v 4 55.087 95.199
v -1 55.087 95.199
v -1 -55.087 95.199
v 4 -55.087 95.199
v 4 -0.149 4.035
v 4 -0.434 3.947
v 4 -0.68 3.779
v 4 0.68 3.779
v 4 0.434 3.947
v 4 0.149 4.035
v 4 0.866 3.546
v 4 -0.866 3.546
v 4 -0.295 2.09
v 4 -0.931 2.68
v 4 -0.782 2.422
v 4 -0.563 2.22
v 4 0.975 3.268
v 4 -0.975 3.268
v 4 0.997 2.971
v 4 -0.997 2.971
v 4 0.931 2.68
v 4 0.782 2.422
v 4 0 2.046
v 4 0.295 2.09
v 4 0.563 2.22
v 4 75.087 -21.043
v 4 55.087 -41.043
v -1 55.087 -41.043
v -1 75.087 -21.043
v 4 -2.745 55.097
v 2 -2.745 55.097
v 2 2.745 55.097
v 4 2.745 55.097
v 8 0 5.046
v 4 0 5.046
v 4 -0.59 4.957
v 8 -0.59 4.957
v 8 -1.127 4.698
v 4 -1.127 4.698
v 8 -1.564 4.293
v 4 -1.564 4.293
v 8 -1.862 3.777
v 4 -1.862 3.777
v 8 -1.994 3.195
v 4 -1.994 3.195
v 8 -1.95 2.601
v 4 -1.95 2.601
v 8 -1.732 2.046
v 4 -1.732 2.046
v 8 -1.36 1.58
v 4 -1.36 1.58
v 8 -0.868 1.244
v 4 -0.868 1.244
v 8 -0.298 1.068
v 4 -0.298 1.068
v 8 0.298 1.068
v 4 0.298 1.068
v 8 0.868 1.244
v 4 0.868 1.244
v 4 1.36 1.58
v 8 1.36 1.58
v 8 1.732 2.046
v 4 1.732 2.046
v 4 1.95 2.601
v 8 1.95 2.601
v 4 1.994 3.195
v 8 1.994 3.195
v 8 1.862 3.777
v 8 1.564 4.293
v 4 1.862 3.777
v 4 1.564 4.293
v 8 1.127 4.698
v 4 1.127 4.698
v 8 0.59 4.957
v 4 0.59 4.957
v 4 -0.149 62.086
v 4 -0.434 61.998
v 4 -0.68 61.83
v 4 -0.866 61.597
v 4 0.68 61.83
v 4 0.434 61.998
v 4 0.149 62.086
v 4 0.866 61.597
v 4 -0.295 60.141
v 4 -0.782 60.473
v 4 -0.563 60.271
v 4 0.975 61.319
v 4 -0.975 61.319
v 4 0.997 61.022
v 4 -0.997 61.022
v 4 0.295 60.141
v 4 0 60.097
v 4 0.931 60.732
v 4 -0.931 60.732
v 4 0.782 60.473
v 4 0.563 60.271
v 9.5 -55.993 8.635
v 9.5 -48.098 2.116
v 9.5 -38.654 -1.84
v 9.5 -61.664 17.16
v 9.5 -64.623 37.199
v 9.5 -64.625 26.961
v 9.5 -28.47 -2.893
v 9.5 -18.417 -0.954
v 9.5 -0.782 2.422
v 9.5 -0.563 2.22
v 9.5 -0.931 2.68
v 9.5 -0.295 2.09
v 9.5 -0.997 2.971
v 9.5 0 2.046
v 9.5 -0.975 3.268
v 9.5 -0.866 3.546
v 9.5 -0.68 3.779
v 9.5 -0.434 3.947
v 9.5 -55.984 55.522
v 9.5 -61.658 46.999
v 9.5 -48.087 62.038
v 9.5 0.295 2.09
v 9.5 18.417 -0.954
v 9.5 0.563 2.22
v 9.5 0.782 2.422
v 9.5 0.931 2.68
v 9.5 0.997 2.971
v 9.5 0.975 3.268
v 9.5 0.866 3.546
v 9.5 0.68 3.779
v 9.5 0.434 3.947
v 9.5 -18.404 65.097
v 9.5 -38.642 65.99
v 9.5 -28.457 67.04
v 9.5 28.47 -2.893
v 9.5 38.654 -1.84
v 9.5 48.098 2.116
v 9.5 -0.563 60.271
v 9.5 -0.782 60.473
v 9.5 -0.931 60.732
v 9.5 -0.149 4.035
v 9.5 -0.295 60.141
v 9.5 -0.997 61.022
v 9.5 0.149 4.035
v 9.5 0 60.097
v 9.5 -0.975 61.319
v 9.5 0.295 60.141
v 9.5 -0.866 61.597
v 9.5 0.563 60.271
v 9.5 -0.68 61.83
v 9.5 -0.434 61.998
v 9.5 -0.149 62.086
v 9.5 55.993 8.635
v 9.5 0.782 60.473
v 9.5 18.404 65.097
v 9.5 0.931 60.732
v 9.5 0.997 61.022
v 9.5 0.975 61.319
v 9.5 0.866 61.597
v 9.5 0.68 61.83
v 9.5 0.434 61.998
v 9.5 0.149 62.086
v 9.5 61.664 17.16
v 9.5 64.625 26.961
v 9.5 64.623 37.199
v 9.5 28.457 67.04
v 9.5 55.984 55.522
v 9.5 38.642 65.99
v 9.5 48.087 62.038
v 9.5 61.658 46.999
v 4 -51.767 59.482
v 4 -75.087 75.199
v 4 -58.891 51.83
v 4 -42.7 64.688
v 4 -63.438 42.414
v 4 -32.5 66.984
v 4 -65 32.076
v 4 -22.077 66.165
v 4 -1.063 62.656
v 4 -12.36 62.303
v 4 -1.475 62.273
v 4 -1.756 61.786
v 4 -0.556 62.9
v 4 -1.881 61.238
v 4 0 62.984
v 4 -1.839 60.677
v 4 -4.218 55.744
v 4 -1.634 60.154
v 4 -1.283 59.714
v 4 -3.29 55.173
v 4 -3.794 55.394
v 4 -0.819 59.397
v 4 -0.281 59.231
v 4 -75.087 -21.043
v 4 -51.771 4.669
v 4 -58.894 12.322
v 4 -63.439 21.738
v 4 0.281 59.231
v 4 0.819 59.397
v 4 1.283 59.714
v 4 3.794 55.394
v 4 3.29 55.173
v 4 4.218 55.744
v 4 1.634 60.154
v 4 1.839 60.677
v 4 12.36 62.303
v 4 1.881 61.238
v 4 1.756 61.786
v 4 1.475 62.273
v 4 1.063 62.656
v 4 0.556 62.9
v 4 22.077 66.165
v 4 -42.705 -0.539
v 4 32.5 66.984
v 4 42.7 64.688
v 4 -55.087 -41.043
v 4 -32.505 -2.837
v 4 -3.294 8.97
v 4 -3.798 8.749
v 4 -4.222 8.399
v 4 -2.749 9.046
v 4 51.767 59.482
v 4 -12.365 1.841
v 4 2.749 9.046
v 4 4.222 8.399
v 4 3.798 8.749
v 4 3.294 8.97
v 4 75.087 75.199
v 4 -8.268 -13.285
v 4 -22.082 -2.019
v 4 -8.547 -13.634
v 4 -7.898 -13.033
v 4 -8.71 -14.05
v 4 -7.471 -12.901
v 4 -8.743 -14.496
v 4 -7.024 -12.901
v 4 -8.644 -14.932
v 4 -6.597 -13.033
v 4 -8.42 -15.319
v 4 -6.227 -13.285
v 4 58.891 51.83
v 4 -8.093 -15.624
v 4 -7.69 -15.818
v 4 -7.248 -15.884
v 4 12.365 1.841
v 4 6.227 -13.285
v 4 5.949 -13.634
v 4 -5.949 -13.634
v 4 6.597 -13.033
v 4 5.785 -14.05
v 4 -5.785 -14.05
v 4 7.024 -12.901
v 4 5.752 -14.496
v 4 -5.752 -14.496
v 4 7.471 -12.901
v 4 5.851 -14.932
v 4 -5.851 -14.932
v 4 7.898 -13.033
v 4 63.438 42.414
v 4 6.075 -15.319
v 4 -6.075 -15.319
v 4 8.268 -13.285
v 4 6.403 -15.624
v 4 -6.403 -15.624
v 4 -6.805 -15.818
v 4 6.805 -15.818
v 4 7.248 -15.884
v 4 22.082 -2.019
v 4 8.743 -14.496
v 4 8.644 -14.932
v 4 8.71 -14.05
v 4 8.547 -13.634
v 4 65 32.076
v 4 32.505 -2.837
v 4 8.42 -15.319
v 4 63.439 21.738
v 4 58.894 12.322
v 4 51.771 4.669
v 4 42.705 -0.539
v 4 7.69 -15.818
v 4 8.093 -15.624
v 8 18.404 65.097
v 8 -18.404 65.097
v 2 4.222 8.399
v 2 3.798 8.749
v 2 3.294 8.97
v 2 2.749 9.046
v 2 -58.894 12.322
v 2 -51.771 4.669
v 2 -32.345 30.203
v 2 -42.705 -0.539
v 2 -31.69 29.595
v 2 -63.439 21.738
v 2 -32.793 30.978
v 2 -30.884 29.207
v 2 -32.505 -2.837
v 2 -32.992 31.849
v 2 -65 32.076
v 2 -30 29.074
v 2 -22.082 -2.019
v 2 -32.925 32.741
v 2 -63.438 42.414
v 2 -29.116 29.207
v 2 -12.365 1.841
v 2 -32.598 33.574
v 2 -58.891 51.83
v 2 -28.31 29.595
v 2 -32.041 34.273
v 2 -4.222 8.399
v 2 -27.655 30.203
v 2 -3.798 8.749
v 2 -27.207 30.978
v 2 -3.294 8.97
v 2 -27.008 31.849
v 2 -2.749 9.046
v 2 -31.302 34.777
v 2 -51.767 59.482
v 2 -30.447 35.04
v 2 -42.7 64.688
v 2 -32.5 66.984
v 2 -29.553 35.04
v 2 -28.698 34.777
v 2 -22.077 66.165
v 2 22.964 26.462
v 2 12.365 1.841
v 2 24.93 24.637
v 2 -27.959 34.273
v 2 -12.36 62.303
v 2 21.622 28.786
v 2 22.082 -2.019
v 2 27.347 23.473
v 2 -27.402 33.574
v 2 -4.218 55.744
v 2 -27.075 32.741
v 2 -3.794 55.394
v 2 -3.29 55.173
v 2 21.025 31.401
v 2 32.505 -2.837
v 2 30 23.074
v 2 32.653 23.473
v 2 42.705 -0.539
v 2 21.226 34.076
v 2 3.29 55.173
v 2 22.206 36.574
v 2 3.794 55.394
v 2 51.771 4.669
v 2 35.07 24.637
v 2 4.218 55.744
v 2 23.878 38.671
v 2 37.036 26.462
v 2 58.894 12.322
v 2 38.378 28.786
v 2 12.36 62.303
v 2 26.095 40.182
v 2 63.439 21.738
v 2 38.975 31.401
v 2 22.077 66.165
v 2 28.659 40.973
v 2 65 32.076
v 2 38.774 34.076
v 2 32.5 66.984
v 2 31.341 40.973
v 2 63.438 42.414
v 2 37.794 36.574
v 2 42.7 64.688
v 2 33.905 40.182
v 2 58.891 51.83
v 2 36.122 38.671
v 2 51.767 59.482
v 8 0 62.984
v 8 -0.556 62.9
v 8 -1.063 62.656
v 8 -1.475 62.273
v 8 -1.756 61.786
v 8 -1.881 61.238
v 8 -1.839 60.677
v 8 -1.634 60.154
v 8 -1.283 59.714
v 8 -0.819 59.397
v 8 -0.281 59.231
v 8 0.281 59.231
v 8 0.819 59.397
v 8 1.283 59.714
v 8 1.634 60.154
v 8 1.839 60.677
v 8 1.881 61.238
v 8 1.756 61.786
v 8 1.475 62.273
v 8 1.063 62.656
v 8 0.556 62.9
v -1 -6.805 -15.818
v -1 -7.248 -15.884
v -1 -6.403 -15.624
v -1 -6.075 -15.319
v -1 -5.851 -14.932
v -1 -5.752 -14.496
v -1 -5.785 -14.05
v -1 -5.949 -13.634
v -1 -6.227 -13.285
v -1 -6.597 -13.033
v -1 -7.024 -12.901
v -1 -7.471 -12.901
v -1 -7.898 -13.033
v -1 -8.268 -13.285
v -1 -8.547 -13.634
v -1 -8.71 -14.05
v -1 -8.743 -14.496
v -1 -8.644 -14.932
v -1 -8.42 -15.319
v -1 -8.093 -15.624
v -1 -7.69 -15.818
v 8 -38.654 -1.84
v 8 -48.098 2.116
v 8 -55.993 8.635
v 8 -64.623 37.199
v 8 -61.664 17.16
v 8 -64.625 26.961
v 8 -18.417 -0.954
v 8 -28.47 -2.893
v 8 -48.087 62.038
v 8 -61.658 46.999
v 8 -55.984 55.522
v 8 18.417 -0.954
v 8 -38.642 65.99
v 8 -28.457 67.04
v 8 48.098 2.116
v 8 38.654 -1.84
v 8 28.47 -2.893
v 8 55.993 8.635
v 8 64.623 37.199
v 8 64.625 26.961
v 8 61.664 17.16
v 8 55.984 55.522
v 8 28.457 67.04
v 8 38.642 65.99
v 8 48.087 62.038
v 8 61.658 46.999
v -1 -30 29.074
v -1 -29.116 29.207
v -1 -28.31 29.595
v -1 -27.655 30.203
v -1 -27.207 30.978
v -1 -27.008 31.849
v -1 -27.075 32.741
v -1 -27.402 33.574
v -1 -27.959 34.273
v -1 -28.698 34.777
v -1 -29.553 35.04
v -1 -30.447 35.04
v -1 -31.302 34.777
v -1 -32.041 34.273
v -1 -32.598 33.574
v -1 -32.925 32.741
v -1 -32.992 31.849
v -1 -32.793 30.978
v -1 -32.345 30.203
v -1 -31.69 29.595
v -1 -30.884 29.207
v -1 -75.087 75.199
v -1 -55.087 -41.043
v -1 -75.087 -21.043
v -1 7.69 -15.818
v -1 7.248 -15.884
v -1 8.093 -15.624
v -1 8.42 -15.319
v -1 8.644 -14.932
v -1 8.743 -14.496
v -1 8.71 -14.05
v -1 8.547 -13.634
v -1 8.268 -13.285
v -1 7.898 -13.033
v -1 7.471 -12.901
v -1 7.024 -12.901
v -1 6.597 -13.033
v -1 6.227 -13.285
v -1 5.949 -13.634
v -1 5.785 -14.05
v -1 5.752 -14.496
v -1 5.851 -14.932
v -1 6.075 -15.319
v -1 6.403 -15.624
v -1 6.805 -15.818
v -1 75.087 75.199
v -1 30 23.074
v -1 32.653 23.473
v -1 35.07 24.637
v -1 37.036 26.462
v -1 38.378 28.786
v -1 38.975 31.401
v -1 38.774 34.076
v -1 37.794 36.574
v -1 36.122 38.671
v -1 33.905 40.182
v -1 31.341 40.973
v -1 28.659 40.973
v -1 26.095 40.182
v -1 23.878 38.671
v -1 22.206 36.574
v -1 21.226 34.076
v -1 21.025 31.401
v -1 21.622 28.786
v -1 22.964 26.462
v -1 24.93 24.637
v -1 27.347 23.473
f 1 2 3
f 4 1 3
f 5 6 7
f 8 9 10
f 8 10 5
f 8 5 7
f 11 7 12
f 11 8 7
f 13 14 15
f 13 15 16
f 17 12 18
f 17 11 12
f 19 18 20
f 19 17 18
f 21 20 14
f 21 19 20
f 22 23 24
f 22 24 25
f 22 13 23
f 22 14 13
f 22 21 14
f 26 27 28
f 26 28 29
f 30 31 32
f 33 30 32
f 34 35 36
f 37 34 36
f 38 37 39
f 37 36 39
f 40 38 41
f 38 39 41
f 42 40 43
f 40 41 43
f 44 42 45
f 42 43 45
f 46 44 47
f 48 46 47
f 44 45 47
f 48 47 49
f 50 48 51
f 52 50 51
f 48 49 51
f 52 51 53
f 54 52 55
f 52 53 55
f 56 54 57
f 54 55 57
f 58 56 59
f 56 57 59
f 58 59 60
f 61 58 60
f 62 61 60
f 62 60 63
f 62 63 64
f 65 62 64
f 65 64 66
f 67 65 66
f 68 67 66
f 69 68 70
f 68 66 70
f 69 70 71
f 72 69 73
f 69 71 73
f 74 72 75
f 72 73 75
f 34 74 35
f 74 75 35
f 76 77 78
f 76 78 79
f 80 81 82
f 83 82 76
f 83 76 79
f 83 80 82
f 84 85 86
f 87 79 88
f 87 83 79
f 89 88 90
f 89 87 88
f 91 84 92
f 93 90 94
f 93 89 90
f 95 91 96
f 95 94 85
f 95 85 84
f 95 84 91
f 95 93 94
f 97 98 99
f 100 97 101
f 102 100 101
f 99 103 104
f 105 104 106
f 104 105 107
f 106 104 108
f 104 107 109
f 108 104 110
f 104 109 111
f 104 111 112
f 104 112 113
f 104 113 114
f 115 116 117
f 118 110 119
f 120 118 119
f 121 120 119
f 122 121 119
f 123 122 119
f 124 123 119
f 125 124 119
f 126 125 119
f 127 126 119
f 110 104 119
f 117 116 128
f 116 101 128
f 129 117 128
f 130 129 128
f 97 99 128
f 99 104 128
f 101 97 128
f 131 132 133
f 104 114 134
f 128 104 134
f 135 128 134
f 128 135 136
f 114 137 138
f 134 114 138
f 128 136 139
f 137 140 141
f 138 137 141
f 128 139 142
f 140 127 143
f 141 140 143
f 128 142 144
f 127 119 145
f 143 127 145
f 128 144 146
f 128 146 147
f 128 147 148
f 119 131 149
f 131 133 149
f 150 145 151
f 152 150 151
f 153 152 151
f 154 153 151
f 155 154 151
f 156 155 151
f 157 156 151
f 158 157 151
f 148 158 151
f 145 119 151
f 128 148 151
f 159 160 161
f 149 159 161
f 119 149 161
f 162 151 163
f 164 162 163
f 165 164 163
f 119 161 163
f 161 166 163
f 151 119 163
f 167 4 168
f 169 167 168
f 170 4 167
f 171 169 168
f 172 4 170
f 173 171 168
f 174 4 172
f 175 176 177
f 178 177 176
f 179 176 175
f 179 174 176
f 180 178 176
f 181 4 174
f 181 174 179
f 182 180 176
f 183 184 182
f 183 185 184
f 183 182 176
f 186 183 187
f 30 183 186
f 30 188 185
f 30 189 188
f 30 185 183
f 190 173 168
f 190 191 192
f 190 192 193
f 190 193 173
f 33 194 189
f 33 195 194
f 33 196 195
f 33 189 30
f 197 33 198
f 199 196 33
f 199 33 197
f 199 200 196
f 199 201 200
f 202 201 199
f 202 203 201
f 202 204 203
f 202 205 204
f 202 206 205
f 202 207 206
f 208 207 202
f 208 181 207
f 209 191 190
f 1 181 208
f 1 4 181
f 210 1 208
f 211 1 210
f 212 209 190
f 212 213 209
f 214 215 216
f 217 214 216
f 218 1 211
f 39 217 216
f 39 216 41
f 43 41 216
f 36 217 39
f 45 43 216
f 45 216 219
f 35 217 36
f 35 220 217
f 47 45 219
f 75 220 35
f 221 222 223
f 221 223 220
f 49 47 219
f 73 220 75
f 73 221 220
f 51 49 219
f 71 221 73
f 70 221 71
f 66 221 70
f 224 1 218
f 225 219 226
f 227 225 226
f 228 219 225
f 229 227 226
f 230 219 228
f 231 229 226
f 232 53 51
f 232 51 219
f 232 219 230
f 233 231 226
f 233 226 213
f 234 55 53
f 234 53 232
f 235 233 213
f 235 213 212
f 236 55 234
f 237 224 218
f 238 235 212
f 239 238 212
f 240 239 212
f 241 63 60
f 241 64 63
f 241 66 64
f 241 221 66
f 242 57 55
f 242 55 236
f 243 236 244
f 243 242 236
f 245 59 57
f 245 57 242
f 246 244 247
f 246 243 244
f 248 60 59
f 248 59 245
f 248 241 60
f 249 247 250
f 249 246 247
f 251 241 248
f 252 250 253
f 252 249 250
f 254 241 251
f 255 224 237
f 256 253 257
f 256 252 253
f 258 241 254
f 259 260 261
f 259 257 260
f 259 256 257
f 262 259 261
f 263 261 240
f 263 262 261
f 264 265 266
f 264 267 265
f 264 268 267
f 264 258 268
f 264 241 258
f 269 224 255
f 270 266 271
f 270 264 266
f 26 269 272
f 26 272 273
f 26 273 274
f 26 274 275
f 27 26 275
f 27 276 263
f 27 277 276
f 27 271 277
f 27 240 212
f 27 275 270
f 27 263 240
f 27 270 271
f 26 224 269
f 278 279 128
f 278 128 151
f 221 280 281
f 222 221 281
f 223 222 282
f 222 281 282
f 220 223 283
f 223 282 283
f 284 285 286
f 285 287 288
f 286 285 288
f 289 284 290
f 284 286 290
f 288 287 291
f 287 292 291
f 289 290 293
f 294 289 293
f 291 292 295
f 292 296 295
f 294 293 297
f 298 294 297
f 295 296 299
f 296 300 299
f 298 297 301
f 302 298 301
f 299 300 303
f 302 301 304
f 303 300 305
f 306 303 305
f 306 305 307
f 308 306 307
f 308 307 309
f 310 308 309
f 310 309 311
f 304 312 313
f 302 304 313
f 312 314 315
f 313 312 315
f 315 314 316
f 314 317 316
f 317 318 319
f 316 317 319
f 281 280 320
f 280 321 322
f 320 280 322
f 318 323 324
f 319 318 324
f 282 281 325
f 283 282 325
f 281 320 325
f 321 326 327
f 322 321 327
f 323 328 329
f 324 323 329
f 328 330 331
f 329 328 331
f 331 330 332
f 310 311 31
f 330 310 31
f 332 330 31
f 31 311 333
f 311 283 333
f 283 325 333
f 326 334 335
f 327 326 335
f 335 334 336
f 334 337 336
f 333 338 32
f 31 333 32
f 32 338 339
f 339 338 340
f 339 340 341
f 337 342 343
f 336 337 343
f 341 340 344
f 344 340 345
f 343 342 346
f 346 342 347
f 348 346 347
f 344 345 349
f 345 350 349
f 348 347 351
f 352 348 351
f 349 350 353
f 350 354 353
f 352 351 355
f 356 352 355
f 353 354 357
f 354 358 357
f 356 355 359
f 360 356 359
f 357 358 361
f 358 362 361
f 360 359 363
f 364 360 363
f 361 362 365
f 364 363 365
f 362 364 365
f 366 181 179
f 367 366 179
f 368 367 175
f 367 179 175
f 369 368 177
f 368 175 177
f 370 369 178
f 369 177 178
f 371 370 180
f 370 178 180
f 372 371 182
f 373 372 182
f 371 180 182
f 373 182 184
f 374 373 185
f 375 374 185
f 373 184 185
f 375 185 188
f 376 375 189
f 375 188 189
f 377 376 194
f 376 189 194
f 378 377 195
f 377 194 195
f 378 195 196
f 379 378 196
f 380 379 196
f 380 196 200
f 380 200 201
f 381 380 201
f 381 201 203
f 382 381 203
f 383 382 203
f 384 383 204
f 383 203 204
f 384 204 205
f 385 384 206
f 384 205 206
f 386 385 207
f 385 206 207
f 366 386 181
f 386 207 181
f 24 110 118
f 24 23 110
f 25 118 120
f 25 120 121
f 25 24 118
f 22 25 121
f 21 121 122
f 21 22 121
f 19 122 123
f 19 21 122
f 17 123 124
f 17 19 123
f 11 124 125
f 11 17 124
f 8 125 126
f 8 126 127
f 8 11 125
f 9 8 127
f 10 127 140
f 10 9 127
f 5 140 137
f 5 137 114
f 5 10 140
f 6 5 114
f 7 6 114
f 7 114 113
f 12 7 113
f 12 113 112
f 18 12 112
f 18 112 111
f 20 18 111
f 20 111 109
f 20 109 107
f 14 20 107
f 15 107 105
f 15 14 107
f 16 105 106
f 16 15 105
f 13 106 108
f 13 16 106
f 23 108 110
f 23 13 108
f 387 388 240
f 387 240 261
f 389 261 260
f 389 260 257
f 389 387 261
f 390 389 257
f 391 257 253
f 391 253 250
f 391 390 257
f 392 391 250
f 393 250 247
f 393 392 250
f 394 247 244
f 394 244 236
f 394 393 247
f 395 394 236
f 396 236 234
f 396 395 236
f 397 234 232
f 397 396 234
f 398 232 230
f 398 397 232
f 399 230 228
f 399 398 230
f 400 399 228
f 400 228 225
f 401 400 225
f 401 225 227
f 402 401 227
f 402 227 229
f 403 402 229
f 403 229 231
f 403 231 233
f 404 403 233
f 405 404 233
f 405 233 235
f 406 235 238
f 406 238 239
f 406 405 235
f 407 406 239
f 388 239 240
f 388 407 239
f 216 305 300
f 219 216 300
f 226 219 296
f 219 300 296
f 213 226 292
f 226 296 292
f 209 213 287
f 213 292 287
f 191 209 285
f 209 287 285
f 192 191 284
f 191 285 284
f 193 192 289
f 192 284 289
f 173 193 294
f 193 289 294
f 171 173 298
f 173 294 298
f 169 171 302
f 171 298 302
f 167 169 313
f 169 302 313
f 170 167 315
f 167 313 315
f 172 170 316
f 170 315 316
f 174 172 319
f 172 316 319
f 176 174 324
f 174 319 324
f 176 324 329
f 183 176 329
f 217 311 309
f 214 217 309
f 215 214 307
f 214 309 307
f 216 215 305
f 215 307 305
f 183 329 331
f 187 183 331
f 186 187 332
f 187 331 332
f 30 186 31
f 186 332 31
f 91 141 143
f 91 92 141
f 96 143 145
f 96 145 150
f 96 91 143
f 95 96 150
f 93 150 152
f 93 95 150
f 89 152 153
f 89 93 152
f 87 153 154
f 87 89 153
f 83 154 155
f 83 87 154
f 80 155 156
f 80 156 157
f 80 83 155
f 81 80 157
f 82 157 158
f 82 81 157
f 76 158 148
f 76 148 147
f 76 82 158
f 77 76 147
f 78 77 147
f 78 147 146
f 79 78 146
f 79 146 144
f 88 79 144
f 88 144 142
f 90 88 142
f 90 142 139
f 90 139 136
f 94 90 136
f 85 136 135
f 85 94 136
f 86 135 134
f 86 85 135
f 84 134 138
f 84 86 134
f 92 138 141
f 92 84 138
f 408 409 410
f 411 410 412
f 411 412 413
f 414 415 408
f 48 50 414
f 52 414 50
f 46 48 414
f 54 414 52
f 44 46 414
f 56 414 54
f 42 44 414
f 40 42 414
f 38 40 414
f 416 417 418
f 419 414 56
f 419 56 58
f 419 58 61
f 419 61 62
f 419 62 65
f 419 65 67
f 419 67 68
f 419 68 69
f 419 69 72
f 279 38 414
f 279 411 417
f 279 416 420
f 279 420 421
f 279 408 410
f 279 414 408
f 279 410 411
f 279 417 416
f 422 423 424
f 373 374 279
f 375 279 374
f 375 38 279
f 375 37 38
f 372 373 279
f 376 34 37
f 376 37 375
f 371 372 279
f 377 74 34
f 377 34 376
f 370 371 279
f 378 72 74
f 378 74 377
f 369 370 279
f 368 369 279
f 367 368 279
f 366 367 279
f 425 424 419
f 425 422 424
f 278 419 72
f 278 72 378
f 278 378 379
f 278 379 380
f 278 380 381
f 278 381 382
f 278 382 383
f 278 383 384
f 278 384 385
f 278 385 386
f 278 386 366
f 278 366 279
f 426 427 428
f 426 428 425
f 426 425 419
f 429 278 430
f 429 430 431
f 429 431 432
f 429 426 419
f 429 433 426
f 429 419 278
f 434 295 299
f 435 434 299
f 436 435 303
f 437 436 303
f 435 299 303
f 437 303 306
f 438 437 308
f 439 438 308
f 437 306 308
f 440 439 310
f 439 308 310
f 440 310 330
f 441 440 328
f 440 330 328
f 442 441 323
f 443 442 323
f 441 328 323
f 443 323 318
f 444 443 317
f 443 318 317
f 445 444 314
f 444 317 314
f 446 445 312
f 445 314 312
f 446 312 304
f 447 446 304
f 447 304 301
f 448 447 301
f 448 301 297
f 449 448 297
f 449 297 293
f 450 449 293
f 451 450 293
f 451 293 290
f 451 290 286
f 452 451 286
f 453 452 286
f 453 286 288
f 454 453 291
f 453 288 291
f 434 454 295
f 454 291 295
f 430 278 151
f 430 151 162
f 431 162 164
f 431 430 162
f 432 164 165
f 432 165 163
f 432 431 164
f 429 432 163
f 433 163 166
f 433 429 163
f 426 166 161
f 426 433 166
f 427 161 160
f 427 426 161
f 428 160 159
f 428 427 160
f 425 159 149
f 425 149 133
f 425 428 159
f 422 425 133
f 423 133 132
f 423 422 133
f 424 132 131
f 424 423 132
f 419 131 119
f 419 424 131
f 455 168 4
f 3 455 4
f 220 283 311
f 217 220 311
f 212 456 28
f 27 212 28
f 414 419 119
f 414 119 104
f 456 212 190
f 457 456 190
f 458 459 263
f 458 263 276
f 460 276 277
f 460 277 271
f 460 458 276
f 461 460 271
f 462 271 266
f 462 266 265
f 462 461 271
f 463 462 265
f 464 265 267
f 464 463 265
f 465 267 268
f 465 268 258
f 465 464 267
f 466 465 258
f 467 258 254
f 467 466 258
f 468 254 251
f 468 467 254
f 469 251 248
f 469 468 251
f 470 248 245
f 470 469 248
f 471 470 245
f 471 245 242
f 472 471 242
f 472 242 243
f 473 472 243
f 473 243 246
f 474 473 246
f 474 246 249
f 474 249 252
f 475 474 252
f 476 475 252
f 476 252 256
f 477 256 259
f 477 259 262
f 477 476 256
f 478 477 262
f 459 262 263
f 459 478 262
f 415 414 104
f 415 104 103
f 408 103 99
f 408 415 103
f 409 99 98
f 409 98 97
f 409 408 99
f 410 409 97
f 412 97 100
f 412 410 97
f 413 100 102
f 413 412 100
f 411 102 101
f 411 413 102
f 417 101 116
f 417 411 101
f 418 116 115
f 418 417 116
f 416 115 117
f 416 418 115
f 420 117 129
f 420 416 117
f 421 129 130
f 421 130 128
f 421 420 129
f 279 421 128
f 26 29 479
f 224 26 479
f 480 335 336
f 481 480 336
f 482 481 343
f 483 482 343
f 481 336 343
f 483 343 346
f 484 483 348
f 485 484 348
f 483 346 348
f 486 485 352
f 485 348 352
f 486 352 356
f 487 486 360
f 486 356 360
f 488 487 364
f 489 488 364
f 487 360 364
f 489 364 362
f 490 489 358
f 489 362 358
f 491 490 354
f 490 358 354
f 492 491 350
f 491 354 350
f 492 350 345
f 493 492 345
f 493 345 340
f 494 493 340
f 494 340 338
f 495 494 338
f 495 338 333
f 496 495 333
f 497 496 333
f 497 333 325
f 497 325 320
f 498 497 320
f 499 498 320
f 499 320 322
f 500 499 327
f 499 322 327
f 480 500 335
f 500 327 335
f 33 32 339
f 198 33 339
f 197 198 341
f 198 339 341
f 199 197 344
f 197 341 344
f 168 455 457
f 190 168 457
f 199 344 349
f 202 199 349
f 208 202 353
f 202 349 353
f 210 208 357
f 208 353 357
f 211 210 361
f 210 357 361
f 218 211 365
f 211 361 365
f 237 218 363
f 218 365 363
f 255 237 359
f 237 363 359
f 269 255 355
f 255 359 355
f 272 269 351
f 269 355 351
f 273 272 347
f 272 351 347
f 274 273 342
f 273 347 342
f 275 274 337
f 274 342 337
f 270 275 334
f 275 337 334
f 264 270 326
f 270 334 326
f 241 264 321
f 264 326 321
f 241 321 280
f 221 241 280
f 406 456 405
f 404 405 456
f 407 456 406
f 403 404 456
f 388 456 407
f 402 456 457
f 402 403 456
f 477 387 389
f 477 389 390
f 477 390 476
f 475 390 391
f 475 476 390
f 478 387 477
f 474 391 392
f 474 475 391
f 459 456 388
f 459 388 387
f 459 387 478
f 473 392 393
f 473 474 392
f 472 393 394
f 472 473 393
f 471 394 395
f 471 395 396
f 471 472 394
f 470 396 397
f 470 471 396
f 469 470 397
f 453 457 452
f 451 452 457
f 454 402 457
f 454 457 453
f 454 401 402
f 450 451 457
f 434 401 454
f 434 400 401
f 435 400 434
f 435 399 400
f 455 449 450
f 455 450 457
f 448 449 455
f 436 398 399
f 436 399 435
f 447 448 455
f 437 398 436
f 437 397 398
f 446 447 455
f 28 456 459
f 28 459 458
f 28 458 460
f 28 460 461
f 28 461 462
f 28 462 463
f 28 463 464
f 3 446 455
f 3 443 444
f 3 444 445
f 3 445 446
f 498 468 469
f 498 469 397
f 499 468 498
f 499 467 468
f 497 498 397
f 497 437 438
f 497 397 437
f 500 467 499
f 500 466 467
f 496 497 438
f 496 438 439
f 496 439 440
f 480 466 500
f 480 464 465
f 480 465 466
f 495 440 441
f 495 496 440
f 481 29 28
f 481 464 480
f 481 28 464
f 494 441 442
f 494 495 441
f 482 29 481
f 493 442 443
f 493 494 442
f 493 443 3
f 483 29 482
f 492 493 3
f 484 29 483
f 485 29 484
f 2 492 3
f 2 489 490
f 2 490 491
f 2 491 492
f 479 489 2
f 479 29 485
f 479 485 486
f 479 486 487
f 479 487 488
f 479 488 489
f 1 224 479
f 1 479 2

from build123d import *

# Parameters (mm, degrees)
BOSS_EXTRUDE1_DEPTH      = 4
BOSS_EXTRUDE1_DEPTH_BACK = 1
SKETCH1_R                = 1.5
CUT_EXTRUDE2_DEPTH       = 122.350119937
BOSS_EXTRUDE2_START      = -5
BOSS_EXTRUDE2_DEPTH      = 3
SKETCH10_R               = 9
SKETCH10_R_2             = 3
CUT_EXTRUDE3_DEPTH       = 3
SKETCH11_R               = 1.886589546
SKETCH11_R_2             = 1
SKETCH11_R_3             = 2
BOSS_EXTRUDE3_DEPTH      = 4
SKETCH12_R               = 1
BOSS_EXTRUDE4_DEPTH      = 1.5


with BuildPart() as part:
    # Sketch1 → Boss-Extrude1 (new, two sides: drawn at the far end of the back side and taken through both)
    with BuildSketch(Plane(origin=(0, 0, 0), x_dir=(0, 0, -1), z_dir=(1, 0, 0)).offset(-BOSS_EXTRUDE1_DEPTH_BACK)):
        Polygon((-75.000724601, -75.086592855), (41.04338169, -75.086592855), (41.04338169, 75.086592855), (-75.000724601, 75.086592855), (-95.199029314, 75.086592855), (-95.199029314, -75.086592855), align=None)
        with Locations((14.384168299, 7.24761685)):
            Circle(SKETCH1_R, mode=Mode.SUBTRACT)
        with Locations((14.384168299, -7.24761685)):
            Circle(SKETCH1_R, mode=Mode.SUBTRACT)
        with BuildLine():
            Line((-55.096951607, 0), (-55.096951607, 2.745063445))
            ThreePointArc((-55.096951607, 2.745063445), (-55.265937152, 3.549666494), (-55.744337674, 4.218303259))
            ThreePointArc((-55.744337674, 4.218303259), (-32.076418352, 64.999999886), (-8.39868917, 4.222124053))
            ThreePointArc((-8.39868917, 4.222124053), (-8.876916854, 3.553557854), (-9.045837474, 2.74910257))
            Line((-9.045837474, 2.74910257), (-9.045837474, 0))
            Line((-9.045837474, 0), (-9.045837474, -2.74910257))
            ThreePointArc((-9.045837474, -2.74910257), (-8.876916854, -3.553557854), (-8.39868917, -4.222124053))
            ThreePointArc((-8.39868917, -4.222124053), (-32.076418352, -64.999999886), (-55.744337674, -4.218303259))
            ThreePointArc((-55.744337674, -4.218303259), (-55.265937152, -3.549666494), (-55.096951607, -2.745063445))
            Line((-55.096951607, -2.745063445), (-55.096951607, 0))
        make_face(mode=Mode.SUBTRACT)
    extrude(amount=BOSS_EXTRUDE1_DEPTH + BOSS_EXTRUDE1_DEPTH_BACK)

    # Sketch8 → Cut-Extrude2 (cut, through all)
    with BuildSketch(Plane(origin=(4, 0, 0), x_dir=(0, 0, -1), z_dir=(1, 0, 0))):
        Polygon((41.04338169, 75.086592855), (41.04338169, 55.086592855), (21.04338169, 75.086592855), align=None)
        Polygon((41.04338169, -75.086592855), (41.04338169, -55.086592855), (21.04338169, -75.086592855), align=None)
        Polygon((-95.199029314, 55.086592855), (-95.199029314, 75.086592855), (-75.199029314, 75.086592855), align=None)
        Polygon((-95.199029314, -55.086592855), (-95.199029314, -75.086592855), (-75.199029314, -75.086592855), align=None)
    extrude(amount=-CUT_EXTRUDE2_DEPTH, mode=Mode.SUBTRACT)

    # Sketch9 → Boss-Extrude2 (add)
    with BuildSketch(Plane(origin=(4, 0, 0), x_dir=(0, 0, -1), z_dir=(1, 0, 0)).offset(BOSS_EXTRUDE2_START)):
        with BuildLine():
            Line((-55.096951607, 0), (-55.096951607, 2.745063445))
            ThreePointArc((-55.096951607, 2.745063445), (-55.265937152, 3.549666494), (-55.744337674, 4.218303259))
            ThreePointArc((-55.744337674, 4.218303259), (-32.076418352, 64.999999886), (-8.39868917, 4.222124053))
            ThreePointArc((-8.39868917, 4.222124053), (-8.876916854, 3.553557854), (-9.045837474, 2.74910257))
            Line((-9.045837474, 2.74910257), (-9.045837474, 0))
            Line((-9.045837474, 0), (-9.045837474, -2.74910257))
            ThreePointArc((-9.045837474, -2.74910257), (-8.876916854, -3.553557854), (-8.39868917, -4.222124053))
            ThreePointArc((-8.39868917, -4.222124053), (-32.076418352, -64.999999886), (-55.744337674, -4.218303259))
            ThreePointArc((-55.744337674, -4.218303259), (-55.265937152, -3.549666494), (-55.096951607, -2.745063445))
            Line((-55.096951607, -2.745063445), (-55.096951607, 0))
        make_face()
    extrude(amount=BOSS_EXTRUDE2_DEPTH)

    # Sketch10 → Cut-Extrude3 (cut)
    with BuildSketch(Plane(origin=(2, 0, 0), x_dir=(0, 0, -1), z_dir=(1, 0, 0))):
        with Locations((-32.073593851, 30)):
            Circle(SKETCH10_R)
        with Locations((-32.073593851, -30)):
            Circle(SKETCH10_R_2)
    extrude(amount=-CUT_EXTRUDE3_DEPTH, mode=Mode.SUBTRACT)

    # Sketch11 → Boss-Extrude3 (add)
    # profile 1 of 2: a face of its own
    with BuildSketch(Plane(origin=(4, 0, 0), x_dir=(0, 0, -1), z_dir=(1, 0, 0))):
        with Locations(Location((-61.096951607, 0, 0), (0, 0, 180))):
            Circle(SKETCH11_R)
        with Locations((-61.096951607, 0)):
            Circle(SKETCH11_R_2, mode=Mode.SUBTRACT)
    # profile 2 of 2: a face of its own
    with BuildSketch(Plane(origin=(4, 0, 0), x_dir=(0, 0, -1), z_dir=(1, 0, 0))):
        with Locations(Location((-3.045837474, 0, 0), (0, 0, 180))):
            Circle(SKETCH11_R_3)
        with Locations((-3.045837474, 0)):
            Circle(SKETCH11_R_2, mode=Mode.SUBTRACT)
    extrude(amount=BOSS_EXTRUDE3_DEPTH)

    # Sketch12 → Boss-Extrude4 (add)
    with BuildSketch(Plane(origin=(8, 0, 0), x_dir=(0, 0, -1), z_dir=(1, 0, 0))):
        with BuildLine():
            Line((-65.096951607, 0), (-65.096951607, 18.404404175))
            ThreePointArc((-65.096951607, 18.404404175), (-32.080235813, 64.99999937), (0.954162526, 18.416938717))
            Line((0.954162526, 18.416938717), (0.954162526, 0))
            Line((0.954162526, 0), (0.954162526, -18.416938717))
            ThreePointArc((0.954162526, -18.416938717), (-32.080235813, -64.99999937), (-65.096951607, -18.404404175))
            Line((-65.096951607, -18.404404175), (-65.096951607, 0))
        make_face()
        with Locations((-61.096951607, 0)):
            Circle(SKETCH12_R, mode=Mode.SUBTRACT)
        with Locations((-3.045837474, 0)):
            Circle(SKETCH12_R, mode=Mode.SUBTRACT)
    extrude(amount=BOSS_EXTRUDE4_DEPTH)


solid = part.part
